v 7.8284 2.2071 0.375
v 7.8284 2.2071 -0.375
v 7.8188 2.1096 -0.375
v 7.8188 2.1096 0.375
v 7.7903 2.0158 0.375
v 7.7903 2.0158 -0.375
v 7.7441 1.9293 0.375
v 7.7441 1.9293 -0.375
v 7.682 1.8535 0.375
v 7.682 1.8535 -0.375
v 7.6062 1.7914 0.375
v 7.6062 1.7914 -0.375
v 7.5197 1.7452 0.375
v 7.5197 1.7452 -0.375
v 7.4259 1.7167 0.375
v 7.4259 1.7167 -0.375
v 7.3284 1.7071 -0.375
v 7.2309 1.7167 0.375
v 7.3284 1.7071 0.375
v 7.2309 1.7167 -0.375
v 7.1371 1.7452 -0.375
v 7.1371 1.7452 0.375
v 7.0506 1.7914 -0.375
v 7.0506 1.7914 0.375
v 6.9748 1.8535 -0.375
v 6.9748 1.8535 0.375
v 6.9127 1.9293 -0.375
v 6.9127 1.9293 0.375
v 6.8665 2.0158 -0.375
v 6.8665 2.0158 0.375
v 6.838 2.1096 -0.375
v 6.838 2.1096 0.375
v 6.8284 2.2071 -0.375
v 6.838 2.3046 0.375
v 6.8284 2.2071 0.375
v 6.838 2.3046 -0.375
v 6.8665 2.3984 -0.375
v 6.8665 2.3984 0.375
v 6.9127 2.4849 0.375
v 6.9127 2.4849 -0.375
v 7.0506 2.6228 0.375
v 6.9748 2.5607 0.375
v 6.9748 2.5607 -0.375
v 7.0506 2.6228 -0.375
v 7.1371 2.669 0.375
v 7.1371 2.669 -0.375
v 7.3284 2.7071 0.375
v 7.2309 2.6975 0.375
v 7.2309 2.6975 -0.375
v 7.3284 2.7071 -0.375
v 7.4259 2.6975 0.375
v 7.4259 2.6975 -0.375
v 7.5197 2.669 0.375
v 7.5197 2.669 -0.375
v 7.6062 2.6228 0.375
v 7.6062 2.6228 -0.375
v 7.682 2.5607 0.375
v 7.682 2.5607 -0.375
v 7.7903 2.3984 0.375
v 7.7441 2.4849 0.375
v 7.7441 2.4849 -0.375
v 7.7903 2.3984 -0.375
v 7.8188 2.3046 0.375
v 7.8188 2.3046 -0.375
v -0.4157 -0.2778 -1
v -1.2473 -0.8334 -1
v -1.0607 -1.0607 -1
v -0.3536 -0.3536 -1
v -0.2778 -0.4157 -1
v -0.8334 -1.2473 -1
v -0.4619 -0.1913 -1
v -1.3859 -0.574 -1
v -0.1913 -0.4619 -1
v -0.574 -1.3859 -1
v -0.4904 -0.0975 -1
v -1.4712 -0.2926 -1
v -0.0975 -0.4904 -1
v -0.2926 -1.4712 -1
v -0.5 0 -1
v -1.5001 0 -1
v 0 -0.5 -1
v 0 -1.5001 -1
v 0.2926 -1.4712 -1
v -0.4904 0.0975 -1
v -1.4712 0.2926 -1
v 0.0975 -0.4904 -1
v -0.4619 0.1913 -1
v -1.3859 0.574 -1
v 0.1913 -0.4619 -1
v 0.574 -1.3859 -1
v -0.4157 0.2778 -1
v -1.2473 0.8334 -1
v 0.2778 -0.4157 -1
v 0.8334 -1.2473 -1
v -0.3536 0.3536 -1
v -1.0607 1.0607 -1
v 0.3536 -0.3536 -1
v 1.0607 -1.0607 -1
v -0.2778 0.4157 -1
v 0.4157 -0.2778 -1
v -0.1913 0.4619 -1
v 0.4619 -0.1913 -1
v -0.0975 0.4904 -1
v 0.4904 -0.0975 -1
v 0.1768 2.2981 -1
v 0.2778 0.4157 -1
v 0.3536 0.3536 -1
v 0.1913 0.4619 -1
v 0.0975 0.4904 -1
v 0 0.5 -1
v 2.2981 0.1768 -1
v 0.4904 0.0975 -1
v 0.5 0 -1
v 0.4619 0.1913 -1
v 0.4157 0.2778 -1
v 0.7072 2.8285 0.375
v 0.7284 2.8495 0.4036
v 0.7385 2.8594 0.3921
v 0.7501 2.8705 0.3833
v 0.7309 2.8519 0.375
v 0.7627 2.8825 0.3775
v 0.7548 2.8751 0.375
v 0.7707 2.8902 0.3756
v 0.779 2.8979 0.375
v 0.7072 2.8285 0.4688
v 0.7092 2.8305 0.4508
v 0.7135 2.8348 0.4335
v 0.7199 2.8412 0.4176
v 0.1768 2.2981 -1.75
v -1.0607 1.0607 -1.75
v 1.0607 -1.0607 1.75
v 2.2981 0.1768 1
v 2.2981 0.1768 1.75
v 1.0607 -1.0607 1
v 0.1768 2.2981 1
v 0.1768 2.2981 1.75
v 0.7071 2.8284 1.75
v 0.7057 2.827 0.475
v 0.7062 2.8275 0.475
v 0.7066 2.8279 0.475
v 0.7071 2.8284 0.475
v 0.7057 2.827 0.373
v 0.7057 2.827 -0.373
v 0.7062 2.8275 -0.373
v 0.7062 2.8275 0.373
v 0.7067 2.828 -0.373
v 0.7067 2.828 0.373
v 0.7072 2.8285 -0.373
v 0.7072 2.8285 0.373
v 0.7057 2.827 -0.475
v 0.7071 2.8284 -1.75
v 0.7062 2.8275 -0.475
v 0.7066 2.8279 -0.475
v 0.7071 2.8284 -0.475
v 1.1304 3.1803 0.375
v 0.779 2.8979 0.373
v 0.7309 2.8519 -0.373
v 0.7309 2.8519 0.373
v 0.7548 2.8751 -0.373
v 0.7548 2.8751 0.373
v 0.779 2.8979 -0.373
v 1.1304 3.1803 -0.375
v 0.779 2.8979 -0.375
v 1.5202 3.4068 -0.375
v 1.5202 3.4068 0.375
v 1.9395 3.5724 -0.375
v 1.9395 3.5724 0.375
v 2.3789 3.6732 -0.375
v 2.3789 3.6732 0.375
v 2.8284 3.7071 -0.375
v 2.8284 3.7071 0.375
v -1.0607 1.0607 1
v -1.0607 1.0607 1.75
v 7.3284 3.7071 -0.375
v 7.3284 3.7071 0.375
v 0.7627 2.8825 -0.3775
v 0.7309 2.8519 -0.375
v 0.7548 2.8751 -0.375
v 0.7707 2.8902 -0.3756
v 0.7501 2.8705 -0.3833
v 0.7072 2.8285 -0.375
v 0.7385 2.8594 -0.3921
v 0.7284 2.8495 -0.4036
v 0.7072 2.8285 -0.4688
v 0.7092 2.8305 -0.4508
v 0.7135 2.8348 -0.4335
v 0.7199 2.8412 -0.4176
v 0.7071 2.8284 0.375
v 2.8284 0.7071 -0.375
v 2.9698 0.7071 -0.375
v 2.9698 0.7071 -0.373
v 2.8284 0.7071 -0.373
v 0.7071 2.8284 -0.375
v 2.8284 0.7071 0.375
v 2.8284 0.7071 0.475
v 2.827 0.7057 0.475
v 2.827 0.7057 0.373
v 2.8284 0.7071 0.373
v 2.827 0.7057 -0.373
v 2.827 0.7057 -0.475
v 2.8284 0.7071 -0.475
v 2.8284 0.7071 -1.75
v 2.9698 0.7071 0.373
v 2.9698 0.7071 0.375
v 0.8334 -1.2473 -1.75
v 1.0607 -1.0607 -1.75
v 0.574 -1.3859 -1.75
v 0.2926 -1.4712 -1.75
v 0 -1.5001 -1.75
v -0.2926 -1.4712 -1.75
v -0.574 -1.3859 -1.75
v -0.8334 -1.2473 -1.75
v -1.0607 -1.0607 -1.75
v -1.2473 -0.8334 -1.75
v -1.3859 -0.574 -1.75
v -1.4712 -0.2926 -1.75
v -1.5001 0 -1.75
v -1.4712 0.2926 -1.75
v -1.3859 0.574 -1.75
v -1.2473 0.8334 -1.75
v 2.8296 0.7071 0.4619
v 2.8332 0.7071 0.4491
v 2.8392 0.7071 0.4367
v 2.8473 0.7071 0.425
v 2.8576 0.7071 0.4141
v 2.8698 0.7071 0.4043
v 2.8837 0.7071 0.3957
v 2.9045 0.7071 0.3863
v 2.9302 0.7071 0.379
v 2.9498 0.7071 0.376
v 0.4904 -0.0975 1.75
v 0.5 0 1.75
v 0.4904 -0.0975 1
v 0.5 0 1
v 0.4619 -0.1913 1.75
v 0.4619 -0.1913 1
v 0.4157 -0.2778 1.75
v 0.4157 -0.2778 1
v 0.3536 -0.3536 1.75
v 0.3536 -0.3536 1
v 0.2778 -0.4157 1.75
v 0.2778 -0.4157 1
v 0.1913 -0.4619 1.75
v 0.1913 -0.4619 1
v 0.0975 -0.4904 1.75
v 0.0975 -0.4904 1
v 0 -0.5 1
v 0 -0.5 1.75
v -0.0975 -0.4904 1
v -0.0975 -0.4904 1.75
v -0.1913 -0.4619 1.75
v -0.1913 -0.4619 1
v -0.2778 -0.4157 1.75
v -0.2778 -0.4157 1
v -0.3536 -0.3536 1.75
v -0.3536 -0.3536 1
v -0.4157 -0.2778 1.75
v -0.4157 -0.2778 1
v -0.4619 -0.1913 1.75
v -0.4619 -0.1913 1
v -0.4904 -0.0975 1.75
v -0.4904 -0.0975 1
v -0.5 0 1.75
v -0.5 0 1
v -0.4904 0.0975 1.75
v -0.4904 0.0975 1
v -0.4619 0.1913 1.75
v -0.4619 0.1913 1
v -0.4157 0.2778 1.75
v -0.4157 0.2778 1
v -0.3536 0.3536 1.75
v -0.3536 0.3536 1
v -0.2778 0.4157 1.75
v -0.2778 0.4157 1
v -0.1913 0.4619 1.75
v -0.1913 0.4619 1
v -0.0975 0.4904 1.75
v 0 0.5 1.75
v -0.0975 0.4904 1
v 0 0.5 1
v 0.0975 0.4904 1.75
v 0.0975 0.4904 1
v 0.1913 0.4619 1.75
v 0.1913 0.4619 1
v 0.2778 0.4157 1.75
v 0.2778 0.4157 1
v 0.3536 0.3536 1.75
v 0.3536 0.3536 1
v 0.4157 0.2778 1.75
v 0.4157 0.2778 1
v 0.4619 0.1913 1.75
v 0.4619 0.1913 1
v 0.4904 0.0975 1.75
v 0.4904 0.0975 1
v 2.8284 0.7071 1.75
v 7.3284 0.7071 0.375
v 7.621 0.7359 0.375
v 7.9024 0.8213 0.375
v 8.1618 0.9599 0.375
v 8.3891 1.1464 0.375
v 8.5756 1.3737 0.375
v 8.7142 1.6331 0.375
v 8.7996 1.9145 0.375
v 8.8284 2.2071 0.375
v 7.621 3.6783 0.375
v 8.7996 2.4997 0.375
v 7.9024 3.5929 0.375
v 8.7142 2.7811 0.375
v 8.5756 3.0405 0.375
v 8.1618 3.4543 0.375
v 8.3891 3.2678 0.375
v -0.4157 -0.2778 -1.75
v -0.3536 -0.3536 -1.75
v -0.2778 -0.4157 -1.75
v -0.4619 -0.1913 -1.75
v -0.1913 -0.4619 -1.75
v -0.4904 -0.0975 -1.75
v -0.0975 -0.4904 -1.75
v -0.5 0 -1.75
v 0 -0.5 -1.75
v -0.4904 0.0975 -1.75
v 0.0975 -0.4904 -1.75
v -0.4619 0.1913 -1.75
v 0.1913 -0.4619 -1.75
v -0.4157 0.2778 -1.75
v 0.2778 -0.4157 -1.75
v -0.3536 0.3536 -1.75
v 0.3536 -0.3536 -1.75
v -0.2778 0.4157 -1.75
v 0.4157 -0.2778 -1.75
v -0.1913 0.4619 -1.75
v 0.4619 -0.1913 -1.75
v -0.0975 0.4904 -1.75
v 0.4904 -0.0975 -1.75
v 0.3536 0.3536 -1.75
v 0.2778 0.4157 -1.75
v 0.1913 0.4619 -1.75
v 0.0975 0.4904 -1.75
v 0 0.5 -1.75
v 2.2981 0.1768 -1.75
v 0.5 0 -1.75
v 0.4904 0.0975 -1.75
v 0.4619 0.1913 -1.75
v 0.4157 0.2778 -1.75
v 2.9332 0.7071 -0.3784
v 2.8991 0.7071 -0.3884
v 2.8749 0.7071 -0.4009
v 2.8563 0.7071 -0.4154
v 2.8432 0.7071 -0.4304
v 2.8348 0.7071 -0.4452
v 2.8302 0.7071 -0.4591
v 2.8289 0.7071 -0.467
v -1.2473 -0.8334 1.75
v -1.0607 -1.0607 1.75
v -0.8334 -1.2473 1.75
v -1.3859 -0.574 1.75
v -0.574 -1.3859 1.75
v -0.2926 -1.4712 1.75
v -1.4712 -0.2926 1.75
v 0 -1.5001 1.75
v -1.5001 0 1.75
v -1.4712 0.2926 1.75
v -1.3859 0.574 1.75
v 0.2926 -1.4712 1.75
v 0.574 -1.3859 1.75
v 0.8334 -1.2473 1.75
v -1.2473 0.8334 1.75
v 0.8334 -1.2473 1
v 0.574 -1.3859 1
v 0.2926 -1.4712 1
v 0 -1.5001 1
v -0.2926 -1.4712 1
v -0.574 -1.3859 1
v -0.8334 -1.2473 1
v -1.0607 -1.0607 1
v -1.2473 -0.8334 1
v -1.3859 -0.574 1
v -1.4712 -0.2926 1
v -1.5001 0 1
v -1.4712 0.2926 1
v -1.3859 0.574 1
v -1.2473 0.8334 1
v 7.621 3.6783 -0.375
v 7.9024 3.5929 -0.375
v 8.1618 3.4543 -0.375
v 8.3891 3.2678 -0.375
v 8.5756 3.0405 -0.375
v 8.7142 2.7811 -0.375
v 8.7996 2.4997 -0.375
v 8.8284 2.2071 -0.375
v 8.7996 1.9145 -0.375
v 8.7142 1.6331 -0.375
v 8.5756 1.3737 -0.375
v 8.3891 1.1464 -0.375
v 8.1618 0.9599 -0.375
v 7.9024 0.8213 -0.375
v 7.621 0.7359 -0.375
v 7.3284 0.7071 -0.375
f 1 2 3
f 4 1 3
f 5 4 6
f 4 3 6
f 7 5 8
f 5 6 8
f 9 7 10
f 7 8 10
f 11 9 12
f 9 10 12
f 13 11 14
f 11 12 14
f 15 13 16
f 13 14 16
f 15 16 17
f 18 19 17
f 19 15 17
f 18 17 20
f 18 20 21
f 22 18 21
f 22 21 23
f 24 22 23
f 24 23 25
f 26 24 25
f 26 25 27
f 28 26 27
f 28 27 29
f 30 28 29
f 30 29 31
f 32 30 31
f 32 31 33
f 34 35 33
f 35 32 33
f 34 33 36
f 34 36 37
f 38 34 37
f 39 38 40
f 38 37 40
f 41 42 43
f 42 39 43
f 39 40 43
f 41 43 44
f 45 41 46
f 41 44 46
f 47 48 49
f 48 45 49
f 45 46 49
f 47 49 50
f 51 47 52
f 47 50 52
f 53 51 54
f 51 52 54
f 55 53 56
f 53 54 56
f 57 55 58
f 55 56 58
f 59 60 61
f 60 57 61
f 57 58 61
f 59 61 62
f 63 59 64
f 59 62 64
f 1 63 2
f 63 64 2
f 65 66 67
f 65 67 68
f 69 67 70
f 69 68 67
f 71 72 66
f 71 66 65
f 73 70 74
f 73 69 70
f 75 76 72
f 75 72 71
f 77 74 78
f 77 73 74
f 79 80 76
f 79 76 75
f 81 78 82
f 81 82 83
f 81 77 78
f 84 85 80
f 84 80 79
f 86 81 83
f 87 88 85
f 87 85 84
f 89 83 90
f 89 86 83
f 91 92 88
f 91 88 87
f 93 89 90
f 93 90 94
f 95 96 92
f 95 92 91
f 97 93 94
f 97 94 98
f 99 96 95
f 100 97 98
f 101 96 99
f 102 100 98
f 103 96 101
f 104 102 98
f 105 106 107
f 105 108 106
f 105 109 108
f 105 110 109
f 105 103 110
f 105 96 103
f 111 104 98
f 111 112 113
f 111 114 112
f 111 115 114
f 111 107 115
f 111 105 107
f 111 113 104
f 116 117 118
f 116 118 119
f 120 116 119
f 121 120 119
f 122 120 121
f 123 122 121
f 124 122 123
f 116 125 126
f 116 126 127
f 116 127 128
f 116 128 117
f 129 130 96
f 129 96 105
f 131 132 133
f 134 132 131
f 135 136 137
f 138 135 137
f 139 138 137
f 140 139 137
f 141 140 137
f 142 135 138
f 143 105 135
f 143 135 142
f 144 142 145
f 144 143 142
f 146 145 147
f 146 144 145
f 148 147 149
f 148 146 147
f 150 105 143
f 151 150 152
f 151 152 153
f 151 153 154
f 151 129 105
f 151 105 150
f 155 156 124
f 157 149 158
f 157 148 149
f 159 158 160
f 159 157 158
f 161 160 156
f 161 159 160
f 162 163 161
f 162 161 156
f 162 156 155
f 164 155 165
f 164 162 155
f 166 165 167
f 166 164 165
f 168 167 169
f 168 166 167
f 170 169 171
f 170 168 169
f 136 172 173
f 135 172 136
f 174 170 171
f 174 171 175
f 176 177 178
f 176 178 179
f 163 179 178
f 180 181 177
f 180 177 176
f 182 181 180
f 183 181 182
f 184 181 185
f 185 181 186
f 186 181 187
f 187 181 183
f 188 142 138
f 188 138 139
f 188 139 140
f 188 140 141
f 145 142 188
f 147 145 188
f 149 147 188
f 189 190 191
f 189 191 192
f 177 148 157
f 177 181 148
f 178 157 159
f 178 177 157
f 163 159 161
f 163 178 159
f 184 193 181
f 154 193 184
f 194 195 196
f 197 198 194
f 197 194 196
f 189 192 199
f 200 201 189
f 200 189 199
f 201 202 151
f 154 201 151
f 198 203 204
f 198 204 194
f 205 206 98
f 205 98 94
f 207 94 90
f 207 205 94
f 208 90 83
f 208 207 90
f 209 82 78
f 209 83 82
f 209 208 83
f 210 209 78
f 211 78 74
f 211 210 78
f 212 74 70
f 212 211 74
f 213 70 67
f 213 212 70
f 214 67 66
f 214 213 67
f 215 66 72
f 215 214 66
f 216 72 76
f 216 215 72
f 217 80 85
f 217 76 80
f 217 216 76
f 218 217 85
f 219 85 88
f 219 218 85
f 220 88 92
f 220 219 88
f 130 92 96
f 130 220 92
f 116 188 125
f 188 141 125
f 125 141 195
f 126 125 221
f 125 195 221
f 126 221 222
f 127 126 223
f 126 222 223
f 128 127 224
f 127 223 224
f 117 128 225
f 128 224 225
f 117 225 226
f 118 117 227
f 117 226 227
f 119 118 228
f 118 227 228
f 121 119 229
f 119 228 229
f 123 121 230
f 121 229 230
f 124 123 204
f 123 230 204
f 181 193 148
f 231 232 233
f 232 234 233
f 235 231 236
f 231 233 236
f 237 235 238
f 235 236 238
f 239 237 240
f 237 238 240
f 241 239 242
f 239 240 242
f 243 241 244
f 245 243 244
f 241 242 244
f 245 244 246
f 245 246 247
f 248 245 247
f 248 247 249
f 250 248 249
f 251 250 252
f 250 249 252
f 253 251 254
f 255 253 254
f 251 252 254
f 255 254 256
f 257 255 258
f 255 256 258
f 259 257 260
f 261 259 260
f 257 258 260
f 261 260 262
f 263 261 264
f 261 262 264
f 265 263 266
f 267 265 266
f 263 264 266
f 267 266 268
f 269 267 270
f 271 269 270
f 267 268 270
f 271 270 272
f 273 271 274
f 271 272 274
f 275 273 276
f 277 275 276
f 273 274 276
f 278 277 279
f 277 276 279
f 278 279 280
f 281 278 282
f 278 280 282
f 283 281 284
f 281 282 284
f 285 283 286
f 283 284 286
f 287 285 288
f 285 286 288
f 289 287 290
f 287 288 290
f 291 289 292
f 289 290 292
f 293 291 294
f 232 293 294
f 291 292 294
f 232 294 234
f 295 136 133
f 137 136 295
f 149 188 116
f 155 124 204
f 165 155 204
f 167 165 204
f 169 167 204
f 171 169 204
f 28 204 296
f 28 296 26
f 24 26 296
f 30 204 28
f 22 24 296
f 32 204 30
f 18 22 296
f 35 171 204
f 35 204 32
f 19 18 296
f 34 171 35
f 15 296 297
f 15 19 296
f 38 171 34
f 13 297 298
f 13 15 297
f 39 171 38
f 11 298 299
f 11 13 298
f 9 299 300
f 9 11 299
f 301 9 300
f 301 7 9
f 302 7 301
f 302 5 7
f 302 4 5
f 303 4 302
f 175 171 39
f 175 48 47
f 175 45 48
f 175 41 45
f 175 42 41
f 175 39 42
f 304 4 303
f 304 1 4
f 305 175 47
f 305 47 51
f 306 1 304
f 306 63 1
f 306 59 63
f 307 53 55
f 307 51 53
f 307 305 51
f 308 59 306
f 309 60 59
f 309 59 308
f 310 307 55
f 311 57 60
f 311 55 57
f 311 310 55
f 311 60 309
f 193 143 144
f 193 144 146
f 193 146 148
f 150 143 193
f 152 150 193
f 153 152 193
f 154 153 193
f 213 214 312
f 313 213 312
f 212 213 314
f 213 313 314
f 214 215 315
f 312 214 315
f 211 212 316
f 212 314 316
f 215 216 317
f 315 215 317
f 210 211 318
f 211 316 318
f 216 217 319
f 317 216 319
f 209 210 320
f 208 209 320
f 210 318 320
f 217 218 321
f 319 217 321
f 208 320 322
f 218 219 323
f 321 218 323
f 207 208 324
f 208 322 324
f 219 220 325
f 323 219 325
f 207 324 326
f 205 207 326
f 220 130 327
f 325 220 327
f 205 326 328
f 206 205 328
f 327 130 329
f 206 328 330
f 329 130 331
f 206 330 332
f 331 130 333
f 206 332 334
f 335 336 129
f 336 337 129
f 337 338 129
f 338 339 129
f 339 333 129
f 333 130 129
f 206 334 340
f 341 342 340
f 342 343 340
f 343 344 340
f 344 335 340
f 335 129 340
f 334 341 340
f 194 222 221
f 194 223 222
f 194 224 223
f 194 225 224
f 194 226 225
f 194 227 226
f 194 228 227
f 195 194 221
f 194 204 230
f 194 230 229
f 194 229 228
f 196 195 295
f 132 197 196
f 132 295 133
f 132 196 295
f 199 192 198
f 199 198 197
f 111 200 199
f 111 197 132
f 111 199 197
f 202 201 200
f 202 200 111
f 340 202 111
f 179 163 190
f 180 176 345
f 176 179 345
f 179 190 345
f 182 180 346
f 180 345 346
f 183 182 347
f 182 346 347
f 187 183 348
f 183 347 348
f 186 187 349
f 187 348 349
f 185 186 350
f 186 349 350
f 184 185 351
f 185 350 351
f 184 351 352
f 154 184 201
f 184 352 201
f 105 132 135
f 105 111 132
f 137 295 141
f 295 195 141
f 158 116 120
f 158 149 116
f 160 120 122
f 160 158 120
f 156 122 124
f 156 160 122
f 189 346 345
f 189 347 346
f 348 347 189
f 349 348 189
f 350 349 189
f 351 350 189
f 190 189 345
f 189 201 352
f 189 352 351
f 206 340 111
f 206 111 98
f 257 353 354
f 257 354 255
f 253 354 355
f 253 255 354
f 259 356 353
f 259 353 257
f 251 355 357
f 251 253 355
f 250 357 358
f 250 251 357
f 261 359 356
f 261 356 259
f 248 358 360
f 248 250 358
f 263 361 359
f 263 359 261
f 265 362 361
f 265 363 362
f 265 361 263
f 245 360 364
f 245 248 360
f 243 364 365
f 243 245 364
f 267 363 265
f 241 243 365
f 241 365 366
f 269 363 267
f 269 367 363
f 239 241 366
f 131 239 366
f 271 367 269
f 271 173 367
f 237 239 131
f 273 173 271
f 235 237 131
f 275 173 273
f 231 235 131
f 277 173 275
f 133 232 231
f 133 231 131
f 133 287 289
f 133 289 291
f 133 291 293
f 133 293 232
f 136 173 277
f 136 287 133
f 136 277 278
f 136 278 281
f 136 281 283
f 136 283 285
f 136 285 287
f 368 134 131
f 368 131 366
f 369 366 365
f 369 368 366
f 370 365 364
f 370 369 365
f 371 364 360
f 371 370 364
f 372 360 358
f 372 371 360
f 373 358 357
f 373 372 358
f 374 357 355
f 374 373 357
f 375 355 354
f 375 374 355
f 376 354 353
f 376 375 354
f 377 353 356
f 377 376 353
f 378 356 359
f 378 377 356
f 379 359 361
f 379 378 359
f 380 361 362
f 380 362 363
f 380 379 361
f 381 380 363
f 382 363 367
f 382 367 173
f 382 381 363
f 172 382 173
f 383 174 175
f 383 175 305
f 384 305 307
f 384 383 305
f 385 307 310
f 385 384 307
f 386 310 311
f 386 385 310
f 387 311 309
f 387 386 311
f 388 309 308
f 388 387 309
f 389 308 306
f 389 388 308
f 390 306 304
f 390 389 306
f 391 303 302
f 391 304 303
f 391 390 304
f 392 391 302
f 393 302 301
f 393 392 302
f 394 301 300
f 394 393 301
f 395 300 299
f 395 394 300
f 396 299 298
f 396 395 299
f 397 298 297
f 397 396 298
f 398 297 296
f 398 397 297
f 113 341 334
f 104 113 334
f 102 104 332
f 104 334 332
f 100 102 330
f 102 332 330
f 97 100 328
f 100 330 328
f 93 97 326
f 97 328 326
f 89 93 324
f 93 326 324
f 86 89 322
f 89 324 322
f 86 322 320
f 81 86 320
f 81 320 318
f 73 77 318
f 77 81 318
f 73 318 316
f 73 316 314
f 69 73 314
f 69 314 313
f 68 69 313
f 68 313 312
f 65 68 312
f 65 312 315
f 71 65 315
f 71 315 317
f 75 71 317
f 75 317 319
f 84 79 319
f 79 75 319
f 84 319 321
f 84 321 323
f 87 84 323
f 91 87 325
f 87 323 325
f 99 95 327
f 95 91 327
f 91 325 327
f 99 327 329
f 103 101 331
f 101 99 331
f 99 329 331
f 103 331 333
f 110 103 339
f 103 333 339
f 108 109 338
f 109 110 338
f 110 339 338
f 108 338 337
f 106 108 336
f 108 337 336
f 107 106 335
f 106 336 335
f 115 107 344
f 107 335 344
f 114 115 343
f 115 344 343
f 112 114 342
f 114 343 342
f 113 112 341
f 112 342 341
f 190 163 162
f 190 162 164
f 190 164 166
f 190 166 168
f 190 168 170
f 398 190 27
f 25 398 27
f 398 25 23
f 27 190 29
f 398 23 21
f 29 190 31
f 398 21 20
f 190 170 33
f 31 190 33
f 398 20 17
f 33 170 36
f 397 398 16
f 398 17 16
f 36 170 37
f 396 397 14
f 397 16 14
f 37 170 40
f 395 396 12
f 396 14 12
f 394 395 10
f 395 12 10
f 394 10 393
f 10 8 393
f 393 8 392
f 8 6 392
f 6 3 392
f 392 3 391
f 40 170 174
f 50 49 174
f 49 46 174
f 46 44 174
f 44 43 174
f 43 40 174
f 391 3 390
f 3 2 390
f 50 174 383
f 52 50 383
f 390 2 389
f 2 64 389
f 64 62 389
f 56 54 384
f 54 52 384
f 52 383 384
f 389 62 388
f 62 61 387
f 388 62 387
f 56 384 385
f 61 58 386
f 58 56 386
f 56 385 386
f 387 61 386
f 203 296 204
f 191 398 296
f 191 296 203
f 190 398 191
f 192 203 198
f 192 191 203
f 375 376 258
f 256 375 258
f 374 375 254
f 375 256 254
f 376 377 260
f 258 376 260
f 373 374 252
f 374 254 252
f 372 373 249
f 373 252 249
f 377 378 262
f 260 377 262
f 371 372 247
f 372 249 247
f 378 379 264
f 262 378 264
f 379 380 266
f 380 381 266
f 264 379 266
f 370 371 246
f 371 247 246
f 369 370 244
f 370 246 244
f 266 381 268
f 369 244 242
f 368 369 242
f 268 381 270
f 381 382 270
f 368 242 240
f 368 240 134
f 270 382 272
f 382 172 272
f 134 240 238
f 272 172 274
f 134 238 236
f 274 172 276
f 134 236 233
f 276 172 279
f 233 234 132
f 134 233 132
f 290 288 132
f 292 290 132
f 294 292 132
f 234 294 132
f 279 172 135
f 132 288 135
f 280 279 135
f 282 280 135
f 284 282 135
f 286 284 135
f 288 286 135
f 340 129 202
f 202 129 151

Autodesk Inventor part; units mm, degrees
ref_plane "YZ Plane" through (0, 0, 0) normal (1, 0, 0) x (0, 1, 0)
ref_plane "XZ Plane" through (0, 0, 0) normal (0, 1, 0) x (-1, 0, 0)
ref_plane "XY Plane" through (0, 0, 0) normal (0, 0, 1) x (1, 0, 0)
sketch "Sketch1" plane through (0, 0, 0) normal (0, 0, 1) x (1, 0, 0)
  line L0 (0, -3.3292) -> (0, 5.126) projected
  line L1 (-4.3113, 0) -> (11.0184, 0) projected
  line L2 (-1.0607, 1.0607) -> (0.7071, 2.8284)
  arc A0 (2.8284, 3.7071) -> (0.7071, 2.8284) centre (2.8284, 0.7071) ccw
  line L3 (2.8284, 3.7071) -> (7.3284, 3.7071)
  arc A1 (7.3284, 0.7071) -> (7.3284, 3.7071) centre (7.3284, 2.2071) ccw
  line L4 (7.3284, 0.7071) -> (2.8284, 0.7071)
  line L5 (2.8284, 0.7071) -> (1.0607, -1.0607)
  arc A2 (-1.0607, 1.0607) -> (1.0607, -1.0607) centre (0, 0) ccw
  circle A3 centre (0, 0) radius 0.5
  circle A4 centre (7.3284, 2.2071) radius 0.5
  line L6 (2.8284, 0.7071) -> (0.7071, 2.8284)
  line L7 (2.2981, 0.1768) -> (0.1768, 2.2981)
  line L8 (2.2981, 0.1768) -> (2.2981, 0.1768)
  dimension "d0" = 4.5
  dimension "d1" = 45
  dimension "d2" = 1
  dimension "d3" = 1
  dimension "d5" = 2.5
  dimension "d6" = 1.5
  dimension "d8" = 2.5
  dimension "d9" = 1.5
extrude "Extrusion1" add sketch "Sketch1" along normal mid plane 0.75 contours L6 A0 L3 A1 L4
extrude "Extrusion2" add sketch "Sketch1" along normal mid plane 3.5 contours L7 L2 L6 L5
extrude "Extrusion3" add sketch "Sketch1" along normal mid plane 3.5 contours A2 L1 A3 L0 | L0 A3 L1 L5 A2 | A2 L2 L0 A3 L1 | A3 L0 L2 L7 L5 L1
extrude "Extrusion4" cut sketch "Sketch1" along normal mid plane 2 contours A2 L1 A3 L0 | L0 A3 L1 L5 A2 | A2 L2 L0 A3 L1 | A3 L0 L2 L7 L5 L1
fillet "Fillet1" radius 0.1 2 edges at (1.7678, 1.7678, 0.375) (1.7678, 1.7678, -0.375)
properties part number "7c"
